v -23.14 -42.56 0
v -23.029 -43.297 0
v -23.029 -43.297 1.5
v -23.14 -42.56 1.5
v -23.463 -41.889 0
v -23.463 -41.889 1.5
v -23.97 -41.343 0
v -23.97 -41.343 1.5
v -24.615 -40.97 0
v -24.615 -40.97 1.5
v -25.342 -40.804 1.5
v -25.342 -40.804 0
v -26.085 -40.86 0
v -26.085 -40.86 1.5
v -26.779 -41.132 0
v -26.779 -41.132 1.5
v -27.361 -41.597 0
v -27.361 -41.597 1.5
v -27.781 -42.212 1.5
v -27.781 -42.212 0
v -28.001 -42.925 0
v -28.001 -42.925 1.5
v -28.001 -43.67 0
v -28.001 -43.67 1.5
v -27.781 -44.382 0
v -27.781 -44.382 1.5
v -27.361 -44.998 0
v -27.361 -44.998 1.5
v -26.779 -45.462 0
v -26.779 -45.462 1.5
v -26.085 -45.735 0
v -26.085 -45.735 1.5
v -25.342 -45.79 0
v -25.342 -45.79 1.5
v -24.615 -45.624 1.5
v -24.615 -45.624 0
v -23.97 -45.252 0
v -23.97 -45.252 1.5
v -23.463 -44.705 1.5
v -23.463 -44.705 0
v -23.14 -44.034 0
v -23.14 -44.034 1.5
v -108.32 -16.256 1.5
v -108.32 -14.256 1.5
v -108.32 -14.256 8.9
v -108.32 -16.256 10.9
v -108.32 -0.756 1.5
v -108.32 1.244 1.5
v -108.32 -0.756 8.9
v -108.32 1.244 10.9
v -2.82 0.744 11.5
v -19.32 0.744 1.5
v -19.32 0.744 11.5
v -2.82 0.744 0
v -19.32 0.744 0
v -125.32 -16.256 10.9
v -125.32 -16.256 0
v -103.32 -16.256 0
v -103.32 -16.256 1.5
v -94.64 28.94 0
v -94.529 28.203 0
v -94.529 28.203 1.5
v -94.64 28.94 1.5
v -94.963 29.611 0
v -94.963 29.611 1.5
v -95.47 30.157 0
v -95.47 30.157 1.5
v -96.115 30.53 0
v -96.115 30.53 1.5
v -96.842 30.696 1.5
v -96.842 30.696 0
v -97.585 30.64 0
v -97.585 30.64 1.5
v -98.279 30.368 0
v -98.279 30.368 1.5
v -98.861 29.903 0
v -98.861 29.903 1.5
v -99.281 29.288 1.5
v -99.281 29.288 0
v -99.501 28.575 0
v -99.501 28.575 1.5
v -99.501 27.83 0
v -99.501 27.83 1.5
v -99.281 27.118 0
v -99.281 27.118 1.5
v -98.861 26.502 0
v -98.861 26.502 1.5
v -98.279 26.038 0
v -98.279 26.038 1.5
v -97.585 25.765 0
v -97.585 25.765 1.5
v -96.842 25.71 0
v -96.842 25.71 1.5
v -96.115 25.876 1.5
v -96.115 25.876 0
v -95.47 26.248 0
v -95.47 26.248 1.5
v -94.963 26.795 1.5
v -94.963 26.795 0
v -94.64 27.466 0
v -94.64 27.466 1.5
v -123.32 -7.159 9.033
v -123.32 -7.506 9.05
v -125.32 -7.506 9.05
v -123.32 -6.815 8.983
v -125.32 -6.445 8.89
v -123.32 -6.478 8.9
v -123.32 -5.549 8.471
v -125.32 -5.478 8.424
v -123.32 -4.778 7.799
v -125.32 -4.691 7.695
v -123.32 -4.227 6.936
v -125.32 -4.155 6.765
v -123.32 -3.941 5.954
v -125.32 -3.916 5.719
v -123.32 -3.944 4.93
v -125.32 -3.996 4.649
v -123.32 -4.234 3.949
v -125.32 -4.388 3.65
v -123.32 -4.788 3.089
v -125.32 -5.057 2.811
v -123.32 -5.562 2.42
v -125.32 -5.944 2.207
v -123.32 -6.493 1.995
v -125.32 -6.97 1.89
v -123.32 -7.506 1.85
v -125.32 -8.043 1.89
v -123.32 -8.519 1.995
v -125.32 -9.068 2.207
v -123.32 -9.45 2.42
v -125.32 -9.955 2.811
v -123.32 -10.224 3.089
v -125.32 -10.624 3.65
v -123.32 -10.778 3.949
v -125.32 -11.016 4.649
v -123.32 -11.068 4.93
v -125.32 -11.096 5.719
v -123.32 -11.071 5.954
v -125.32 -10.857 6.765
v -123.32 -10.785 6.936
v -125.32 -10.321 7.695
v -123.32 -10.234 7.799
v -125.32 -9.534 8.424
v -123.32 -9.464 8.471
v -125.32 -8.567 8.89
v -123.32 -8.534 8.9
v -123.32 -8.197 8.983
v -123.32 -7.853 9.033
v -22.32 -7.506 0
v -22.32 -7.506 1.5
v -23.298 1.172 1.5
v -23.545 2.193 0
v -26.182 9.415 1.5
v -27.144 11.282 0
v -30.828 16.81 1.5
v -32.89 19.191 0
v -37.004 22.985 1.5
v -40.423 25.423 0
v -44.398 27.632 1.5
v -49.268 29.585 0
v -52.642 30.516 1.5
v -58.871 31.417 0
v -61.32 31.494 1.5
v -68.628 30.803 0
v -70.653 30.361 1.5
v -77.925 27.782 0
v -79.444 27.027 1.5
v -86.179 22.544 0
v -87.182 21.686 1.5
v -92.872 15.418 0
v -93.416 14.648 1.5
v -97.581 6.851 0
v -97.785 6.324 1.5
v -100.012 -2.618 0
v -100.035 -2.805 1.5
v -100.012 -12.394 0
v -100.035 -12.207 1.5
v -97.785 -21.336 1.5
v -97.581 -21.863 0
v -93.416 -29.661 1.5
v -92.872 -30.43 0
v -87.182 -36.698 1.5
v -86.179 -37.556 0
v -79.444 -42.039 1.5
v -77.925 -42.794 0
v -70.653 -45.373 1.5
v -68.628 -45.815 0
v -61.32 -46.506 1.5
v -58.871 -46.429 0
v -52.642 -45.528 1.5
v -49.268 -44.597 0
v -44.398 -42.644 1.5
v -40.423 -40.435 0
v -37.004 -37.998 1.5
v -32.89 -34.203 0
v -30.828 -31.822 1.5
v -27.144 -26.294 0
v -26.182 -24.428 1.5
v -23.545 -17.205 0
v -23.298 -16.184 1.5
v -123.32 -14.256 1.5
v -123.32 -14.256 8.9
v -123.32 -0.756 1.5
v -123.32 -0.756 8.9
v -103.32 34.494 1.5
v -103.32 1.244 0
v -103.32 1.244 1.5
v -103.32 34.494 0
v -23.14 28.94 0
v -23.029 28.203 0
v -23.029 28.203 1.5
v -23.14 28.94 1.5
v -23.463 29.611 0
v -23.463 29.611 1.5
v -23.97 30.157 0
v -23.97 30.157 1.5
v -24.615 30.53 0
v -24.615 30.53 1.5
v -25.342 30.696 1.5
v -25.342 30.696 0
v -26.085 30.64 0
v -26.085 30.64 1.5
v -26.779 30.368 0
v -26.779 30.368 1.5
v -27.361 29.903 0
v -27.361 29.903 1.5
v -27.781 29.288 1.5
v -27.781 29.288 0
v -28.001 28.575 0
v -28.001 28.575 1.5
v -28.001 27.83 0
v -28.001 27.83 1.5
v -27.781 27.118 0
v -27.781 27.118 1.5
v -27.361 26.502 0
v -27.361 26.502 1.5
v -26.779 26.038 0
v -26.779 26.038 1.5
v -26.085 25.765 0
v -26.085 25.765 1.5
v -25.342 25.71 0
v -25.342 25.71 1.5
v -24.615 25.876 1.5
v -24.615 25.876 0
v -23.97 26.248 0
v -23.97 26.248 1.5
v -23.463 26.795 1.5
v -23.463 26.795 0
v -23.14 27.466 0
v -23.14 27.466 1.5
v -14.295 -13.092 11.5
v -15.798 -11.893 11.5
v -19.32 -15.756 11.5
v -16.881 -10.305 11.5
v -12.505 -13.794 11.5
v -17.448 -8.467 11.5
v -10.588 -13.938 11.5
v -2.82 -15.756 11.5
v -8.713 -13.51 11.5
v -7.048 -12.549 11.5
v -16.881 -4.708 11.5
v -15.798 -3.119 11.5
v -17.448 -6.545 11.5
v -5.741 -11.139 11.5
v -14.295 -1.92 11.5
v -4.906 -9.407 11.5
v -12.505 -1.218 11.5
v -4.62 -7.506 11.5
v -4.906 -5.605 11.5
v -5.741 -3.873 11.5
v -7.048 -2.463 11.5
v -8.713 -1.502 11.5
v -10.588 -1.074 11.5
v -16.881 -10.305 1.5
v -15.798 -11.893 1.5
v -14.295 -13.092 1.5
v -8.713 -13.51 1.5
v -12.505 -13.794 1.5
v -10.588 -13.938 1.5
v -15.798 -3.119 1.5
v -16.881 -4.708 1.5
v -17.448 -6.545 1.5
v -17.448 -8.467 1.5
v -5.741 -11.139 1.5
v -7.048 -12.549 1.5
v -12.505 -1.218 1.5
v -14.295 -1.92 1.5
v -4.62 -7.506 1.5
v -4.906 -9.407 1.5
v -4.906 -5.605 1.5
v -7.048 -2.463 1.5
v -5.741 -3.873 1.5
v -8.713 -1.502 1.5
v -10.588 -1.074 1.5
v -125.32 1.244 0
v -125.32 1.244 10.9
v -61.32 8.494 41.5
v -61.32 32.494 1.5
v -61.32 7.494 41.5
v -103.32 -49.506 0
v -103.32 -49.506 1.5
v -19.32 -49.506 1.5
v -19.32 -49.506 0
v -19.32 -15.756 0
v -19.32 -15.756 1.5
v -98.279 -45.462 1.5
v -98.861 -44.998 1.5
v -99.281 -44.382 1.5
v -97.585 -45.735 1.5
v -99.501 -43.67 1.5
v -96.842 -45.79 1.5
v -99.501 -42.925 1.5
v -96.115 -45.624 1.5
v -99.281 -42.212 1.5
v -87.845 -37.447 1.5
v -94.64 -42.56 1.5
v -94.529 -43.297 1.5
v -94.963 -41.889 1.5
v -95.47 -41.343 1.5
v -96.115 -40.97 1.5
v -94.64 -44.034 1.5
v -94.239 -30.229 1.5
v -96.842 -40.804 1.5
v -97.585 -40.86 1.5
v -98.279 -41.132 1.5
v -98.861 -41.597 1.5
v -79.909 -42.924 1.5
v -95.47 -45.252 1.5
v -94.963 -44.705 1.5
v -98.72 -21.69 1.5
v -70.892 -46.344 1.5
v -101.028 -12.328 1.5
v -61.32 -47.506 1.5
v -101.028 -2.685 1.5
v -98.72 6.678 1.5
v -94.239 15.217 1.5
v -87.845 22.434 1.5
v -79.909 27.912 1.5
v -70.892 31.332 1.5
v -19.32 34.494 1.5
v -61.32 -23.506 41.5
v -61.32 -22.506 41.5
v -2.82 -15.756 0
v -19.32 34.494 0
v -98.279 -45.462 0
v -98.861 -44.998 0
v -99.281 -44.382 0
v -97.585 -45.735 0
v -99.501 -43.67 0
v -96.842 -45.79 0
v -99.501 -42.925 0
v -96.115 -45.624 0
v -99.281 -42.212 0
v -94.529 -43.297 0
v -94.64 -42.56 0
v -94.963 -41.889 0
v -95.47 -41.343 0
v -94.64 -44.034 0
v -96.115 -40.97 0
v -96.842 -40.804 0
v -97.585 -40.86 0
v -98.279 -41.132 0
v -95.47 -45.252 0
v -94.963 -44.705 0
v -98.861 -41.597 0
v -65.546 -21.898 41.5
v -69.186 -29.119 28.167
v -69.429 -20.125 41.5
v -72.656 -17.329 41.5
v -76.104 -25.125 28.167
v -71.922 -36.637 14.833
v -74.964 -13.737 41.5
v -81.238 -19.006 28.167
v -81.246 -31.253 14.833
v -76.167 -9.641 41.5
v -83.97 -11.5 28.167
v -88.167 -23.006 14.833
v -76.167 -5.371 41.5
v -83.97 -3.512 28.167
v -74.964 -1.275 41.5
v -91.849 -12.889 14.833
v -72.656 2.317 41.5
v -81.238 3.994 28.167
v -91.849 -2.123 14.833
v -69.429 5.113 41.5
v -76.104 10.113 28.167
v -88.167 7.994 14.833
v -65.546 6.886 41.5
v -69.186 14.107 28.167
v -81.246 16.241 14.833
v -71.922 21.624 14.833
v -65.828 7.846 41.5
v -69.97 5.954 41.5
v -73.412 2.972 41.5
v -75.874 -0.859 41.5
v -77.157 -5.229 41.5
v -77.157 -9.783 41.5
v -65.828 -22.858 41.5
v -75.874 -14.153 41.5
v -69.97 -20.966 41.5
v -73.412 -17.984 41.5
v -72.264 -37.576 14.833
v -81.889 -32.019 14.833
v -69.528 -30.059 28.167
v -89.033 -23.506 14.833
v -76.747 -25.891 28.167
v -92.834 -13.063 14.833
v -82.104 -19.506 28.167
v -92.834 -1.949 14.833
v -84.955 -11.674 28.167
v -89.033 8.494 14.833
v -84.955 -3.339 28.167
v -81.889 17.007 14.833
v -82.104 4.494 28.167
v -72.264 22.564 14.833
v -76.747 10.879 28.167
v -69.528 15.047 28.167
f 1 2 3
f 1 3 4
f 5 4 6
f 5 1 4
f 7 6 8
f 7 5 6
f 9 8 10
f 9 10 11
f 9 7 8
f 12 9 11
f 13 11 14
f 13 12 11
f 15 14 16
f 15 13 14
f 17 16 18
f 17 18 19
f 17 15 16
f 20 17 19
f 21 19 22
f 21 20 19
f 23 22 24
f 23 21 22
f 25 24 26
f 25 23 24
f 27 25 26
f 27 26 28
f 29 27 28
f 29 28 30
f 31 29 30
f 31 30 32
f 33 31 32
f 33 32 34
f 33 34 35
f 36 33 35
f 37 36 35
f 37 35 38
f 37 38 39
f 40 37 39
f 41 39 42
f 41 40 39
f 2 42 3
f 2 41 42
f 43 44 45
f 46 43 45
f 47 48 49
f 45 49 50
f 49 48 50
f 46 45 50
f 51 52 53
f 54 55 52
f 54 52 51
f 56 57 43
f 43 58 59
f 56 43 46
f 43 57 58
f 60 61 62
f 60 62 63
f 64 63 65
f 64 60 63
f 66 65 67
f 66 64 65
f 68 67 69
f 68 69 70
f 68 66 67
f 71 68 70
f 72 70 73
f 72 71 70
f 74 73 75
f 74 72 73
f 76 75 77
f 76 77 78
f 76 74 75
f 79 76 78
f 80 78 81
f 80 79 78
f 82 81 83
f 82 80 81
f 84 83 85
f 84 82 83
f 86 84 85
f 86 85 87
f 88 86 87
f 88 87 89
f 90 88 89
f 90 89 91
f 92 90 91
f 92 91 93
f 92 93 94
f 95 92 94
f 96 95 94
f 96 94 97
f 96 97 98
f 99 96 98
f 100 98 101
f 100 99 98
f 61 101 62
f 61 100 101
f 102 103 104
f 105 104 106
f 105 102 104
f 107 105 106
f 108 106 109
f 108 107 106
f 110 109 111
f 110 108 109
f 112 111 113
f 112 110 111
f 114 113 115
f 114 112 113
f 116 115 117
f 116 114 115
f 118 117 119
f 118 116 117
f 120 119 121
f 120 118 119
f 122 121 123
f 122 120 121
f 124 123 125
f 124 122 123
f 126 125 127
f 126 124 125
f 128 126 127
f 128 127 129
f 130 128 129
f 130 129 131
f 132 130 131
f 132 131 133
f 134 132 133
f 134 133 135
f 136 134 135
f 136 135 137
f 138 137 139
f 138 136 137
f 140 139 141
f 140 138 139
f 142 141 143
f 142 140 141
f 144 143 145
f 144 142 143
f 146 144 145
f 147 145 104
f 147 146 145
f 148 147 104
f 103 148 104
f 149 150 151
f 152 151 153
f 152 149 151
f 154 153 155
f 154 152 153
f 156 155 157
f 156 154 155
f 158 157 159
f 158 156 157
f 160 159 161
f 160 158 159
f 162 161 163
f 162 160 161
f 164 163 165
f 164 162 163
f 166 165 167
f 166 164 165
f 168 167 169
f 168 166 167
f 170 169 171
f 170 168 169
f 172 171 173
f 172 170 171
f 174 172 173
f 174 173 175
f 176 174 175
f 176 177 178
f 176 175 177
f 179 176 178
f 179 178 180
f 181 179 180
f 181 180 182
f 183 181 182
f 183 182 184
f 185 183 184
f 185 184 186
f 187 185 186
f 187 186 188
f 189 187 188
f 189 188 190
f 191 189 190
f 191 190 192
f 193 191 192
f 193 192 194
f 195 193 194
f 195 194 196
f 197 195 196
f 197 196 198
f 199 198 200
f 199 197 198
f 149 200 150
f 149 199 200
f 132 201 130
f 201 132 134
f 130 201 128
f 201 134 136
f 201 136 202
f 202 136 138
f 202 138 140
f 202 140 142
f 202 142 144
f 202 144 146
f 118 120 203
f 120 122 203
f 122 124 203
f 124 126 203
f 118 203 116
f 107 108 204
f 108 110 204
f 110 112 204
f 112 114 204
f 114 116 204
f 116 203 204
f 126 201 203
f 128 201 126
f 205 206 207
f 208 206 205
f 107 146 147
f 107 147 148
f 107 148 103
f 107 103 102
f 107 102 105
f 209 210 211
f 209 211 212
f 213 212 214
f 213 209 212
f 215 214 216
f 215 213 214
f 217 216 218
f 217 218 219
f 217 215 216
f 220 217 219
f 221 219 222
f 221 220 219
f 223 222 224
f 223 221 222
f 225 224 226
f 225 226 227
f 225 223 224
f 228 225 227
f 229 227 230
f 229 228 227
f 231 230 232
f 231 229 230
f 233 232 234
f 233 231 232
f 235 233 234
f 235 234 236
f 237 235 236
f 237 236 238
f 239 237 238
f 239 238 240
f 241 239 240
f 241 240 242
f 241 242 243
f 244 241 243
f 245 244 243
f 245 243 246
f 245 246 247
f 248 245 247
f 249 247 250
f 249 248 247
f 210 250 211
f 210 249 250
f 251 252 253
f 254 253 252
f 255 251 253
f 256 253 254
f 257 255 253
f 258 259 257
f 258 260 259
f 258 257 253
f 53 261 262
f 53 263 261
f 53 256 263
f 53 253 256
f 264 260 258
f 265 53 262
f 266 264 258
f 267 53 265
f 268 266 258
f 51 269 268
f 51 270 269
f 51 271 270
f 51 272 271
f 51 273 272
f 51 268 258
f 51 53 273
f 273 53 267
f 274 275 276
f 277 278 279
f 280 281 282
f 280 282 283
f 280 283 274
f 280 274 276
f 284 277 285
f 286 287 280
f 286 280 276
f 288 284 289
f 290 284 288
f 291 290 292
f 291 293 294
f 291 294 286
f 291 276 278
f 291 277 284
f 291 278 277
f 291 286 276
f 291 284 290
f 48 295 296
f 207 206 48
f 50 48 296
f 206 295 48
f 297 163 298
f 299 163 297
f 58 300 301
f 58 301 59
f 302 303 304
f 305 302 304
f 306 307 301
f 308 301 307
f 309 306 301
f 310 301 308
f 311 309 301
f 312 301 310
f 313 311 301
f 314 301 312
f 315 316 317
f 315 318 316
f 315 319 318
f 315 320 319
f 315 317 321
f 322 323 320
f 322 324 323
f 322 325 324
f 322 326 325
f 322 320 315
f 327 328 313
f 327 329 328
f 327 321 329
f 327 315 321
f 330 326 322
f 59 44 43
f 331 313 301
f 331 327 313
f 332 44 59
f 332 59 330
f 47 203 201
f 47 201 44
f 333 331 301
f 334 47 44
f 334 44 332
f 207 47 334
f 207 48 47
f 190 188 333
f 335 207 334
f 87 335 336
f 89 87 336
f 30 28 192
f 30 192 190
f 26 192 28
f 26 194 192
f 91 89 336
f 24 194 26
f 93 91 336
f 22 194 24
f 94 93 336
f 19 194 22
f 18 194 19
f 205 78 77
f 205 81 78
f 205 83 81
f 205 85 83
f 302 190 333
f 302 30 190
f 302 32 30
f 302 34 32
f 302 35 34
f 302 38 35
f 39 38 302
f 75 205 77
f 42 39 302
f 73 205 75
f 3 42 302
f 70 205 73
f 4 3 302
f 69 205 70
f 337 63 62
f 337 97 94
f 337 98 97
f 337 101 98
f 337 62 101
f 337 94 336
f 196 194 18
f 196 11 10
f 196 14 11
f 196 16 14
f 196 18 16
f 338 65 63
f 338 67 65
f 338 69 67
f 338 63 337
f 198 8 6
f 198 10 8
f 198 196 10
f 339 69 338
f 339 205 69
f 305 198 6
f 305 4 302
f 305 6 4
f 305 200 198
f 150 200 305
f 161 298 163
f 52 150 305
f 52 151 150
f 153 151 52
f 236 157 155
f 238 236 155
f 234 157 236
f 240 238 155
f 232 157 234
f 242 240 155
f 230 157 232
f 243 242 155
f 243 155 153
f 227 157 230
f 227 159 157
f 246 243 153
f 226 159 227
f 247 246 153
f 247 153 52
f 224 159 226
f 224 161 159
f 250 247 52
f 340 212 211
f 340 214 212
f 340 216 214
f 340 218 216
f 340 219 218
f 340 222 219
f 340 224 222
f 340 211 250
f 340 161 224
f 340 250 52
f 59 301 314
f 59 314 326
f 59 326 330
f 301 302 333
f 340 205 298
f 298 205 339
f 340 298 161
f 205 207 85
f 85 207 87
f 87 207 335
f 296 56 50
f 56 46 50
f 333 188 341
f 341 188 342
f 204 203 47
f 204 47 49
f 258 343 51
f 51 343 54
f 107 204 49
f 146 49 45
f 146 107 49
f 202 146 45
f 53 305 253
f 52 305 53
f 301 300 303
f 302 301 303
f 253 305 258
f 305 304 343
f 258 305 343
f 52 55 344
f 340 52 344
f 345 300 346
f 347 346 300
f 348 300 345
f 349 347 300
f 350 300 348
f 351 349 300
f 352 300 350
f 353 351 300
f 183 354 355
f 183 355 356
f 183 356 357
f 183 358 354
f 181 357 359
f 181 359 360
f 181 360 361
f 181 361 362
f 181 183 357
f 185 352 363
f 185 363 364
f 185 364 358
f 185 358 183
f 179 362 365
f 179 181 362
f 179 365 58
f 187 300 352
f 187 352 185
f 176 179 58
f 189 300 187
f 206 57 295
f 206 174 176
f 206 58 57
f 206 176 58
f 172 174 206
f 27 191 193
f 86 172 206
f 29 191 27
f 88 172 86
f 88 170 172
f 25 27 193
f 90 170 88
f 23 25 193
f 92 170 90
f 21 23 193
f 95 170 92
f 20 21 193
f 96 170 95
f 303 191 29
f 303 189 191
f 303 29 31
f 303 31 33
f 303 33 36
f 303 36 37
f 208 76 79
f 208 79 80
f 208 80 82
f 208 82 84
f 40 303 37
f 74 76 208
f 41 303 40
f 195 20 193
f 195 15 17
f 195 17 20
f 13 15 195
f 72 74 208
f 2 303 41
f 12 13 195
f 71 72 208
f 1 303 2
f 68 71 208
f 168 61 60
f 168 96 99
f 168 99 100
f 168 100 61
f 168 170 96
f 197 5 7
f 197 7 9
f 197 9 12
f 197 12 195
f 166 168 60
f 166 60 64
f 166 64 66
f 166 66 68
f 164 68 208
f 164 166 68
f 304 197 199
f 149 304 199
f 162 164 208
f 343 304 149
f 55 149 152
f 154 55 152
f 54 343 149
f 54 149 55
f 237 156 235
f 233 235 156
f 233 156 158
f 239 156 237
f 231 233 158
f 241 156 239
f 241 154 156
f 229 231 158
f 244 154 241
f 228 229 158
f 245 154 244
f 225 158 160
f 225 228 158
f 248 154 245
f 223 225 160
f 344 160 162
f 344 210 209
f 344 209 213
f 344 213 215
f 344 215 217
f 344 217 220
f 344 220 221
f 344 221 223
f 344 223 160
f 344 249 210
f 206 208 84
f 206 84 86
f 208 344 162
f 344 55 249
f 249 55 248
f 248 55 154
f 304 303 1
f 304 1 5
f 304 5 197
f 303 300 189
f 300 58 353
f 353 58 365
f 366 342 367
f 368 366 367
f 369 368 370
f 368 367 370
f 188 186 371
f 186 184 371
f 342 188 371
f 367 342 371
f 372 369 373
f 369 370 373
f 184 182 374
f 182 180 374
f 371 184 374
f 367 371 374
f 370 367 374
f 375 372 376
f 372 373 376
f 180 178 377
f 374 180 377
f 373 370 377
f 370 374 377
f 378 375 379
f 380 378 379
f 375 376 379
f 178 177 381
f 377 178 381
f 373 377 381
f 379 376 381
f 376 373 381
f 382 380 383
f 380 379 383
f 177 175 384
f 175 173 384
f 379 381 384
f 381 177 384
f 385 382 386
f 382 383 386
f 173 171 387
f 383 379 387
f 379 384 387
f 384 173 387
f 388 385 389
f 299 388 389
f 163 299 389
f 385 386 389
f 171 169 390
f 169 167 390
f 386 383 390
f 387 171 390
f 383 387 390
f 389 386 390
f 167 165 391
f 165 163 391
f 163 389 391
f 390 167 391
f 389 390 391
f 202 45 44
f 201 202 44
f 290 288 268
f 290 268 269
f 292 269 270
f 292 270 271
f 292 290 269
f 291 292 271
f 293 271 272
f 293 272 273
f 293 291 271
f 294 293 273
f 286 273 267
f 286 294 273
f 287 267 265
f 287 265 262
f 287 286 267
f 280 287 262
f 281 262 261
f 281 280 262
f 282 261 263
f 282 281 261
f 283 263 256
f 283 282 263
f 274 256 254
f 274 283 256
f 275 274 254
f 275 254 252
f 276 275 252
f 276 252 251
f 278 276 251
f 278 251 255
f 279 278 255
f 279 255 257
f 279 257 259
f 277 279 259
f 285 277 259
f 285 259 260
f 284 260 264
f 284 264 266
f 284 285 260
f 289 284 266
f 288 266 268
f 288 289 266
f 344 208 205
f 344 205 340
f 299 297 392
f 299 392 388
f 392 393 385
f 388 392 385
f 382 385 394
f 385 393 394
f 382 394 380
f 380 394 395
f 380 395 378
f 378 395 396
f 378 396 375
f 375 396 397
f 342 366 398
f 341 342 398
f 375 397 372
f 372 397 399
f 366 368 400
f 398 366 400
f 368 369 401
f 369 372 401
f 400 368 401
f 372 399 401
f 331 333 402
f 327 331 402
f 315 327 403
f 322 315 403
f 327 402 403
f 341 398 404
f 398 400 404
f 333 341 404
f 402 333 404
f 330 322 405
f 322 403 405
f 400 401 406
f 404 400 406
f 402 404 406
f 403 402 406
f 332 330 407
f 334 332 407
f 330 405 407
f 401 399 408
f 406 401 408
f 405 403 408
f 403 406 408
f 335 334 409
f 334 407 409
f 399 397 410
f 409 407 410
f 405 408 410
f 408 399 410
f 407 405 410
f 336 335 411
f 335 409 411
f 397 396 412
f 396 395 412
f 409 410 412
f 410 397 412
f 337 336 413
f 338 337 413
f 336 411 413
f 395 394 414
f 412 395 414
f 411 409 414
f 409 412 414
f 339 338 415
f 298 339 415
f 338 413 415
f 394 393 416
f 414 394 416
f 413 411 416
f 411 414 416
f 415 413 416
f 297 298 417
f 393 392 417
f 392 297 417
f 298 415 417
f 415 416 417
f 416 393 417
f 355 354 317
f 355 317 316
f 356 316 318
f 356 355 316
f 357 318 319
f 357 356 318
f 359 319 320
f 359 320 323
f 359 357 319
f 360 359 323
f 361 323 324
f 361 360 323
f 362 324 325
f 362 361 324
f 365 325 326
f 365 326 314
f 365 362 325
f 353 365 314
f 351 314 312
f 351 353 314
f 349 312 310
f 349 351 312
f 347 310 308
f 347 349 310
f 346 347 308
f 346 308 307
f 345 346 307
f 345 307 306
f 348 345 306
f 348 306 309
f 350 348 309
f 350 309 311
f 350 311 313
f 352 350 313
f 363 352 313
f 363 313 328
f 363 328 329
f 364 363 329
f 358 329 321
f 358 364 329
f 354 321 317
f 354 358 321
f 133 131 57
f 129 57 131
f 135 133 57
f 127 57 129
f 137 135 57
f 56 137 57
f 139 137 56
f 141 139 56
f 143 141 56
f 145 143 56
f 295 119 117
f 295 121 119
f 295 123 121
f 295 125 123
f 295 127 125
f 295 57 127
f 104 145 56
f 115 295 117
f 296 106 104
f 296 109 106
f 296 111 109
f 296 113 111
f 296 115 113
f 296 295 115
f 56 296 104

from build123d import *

# Parameters (mm, degrees)
CROQUIS1_W              = 84
CROQUIS1_H              = 84
CROQUIS1_R              = 39
CROQUIS1_R_2            = 2.5
SALIENTE_EXTRUIR1_DEPTH = 1.5
REVOLUCI_N2_ANGLE       = 180
SALIENTE_EXTRUIR2_DEPTH = 20
SALIENTE_EXTRUIR3_DEPTH = 15
CROQUIS8_W              = 10.9
CROQUIS8_H              = 17.5
CROQUIS8_R              = 3.6
SALIENTE_EXTRUIR4_DEPTH = 2
SALIENTE_EXTRUIR5_DEPTH = 16.5
CROQUIS10_W             = 16.5
CROQUIS10_H             = 16.5
CROQUIS10_R             = 6.45
SALIENTE_EXTRUIR6_DEPTH = 10


with BuildPart() as part:
    # Croquis1 → Saliente-Extruir1 (new body)
    with BuildSketch(Plane.XY):
        with Locations((-61.319838057, -7.506072874)):
            Rectangle(CROQUIS1_W, CROQUIS1_H)
        with Locations((-61.319838057, -7.506072874)):
            Circle(CROQUIS1_R, mode=Mode.SUBTRACT)
        with Locations((-97.028730507, 28.202819575)):
            Circle(CROQUIS1_R_2, mode=Mode.SUBTRACT)
        with Locations((-25.528730507, 28.202819575)):
            Circle(CROQUIS1_R_2, mode=Mode.SUBTRACT)
        with Locations((-25.528730507, -43.297180425)):
            Circle(CROQUIS1_R_2, mode=Mode.SUBTRACT)
        with Locations((-97.028730507, -43.297180425)):
            Circle(CROQUIS1_R_2, mode=Mode.SUBTRACT)
    extrude(amount=SALIENTE_EXTRUIR1_DEPTH)

    # Croquis4 → Revolución2 (revolve)
    with BuildSketch(Plane(origin=(-61.319838057, -49.506072874, 1.5), x_dir=(0, 0, -1), z_dir=(1, 0, 0))):
        Polygon((-40, 27), (0, 3), (0, 2), (-40, 26), align=None)
    revolve(axis=Axis((-61.319838057, -7.506072874, 1.5), (0, 0, -1)), revolution_arc=REVOLUCI_N2_ANGLE)

    # Croquis6 → Saliente-Extruir2 (add)
    with BuildSketch(Plane.ZY.offset(103.319838057)):
        Polygon((0, -7.506072874), (0, -16.256072874), (1.5, -16.256072874), (1.5, 1.243927126), (0, 1.243927126), align=None)
    extrude(amount=SALIENTE_EXTRUIR2_DEPTH)

    # Croquis7 → Saliente-Extruir3 (add)
    with BuildSketch(Plane.ZY.offset(123.319838057)):
        Polygon((10.9, 1.243927126), (1.5, 1.243927126), (1.5, -0.756072874), (8.9, -0.756072874), (8.9, -14.256072874), (1.5, -14.256072874), (1.5, -16.256072874), (10.9, -16.256072874), align=None)
    extrude(amount=-SALIENTE_EXTRUIR3_DEPTH)

    # Croquis8 → Saliente-Extruir4 (add)
    with BuildSketch(Plane.ZY.offset(123.319838057)):
        with Locations((5.45, -7.506072874)):
            Rectangle(CROQUIS8_W, CROQUIS8_H)
        with Locations((5.45, -7.506072874)):
            Circle(CROQUIS8_R, mode=Mode.SUBTRACT)
    extrude(amount=SALIENTE_EXTRUIR4_DEPTH)

    # Croquis9 → Saliente-Extruir5 (add)
    with BuildSketch(Plane(origin=(-19.319838057, 0, 0), x_dir=(0, 0, -1), z_dir=(1, 0, 0))):
        Polygon((0, -7.506072874), (0, 0.743927126), (-1.5, 0.743927126), (-1.5, -15.756072874), (0, -15.756072874), align=None)
    extrude(amount=SALIENTE_EXTRUIR5_DEPTH)

    # Croquis10 → Saliente-Extruir6 (add)
    with BuildSketch(Plane.XY.offset(1.5)):
        with Locations((-11.069838057, -7.506072874)):
            Rectangle(CROQUIS10_W, CROQUIS10_H)
        with Locations((-11.069838057, -7.506072874)):
            Circle(CROQUIS10_R, mode=Mode.SUBTRACT)
    extrude(amount=SALIENTE_EXTRUIR6_DEPTH)


solid = part.part
